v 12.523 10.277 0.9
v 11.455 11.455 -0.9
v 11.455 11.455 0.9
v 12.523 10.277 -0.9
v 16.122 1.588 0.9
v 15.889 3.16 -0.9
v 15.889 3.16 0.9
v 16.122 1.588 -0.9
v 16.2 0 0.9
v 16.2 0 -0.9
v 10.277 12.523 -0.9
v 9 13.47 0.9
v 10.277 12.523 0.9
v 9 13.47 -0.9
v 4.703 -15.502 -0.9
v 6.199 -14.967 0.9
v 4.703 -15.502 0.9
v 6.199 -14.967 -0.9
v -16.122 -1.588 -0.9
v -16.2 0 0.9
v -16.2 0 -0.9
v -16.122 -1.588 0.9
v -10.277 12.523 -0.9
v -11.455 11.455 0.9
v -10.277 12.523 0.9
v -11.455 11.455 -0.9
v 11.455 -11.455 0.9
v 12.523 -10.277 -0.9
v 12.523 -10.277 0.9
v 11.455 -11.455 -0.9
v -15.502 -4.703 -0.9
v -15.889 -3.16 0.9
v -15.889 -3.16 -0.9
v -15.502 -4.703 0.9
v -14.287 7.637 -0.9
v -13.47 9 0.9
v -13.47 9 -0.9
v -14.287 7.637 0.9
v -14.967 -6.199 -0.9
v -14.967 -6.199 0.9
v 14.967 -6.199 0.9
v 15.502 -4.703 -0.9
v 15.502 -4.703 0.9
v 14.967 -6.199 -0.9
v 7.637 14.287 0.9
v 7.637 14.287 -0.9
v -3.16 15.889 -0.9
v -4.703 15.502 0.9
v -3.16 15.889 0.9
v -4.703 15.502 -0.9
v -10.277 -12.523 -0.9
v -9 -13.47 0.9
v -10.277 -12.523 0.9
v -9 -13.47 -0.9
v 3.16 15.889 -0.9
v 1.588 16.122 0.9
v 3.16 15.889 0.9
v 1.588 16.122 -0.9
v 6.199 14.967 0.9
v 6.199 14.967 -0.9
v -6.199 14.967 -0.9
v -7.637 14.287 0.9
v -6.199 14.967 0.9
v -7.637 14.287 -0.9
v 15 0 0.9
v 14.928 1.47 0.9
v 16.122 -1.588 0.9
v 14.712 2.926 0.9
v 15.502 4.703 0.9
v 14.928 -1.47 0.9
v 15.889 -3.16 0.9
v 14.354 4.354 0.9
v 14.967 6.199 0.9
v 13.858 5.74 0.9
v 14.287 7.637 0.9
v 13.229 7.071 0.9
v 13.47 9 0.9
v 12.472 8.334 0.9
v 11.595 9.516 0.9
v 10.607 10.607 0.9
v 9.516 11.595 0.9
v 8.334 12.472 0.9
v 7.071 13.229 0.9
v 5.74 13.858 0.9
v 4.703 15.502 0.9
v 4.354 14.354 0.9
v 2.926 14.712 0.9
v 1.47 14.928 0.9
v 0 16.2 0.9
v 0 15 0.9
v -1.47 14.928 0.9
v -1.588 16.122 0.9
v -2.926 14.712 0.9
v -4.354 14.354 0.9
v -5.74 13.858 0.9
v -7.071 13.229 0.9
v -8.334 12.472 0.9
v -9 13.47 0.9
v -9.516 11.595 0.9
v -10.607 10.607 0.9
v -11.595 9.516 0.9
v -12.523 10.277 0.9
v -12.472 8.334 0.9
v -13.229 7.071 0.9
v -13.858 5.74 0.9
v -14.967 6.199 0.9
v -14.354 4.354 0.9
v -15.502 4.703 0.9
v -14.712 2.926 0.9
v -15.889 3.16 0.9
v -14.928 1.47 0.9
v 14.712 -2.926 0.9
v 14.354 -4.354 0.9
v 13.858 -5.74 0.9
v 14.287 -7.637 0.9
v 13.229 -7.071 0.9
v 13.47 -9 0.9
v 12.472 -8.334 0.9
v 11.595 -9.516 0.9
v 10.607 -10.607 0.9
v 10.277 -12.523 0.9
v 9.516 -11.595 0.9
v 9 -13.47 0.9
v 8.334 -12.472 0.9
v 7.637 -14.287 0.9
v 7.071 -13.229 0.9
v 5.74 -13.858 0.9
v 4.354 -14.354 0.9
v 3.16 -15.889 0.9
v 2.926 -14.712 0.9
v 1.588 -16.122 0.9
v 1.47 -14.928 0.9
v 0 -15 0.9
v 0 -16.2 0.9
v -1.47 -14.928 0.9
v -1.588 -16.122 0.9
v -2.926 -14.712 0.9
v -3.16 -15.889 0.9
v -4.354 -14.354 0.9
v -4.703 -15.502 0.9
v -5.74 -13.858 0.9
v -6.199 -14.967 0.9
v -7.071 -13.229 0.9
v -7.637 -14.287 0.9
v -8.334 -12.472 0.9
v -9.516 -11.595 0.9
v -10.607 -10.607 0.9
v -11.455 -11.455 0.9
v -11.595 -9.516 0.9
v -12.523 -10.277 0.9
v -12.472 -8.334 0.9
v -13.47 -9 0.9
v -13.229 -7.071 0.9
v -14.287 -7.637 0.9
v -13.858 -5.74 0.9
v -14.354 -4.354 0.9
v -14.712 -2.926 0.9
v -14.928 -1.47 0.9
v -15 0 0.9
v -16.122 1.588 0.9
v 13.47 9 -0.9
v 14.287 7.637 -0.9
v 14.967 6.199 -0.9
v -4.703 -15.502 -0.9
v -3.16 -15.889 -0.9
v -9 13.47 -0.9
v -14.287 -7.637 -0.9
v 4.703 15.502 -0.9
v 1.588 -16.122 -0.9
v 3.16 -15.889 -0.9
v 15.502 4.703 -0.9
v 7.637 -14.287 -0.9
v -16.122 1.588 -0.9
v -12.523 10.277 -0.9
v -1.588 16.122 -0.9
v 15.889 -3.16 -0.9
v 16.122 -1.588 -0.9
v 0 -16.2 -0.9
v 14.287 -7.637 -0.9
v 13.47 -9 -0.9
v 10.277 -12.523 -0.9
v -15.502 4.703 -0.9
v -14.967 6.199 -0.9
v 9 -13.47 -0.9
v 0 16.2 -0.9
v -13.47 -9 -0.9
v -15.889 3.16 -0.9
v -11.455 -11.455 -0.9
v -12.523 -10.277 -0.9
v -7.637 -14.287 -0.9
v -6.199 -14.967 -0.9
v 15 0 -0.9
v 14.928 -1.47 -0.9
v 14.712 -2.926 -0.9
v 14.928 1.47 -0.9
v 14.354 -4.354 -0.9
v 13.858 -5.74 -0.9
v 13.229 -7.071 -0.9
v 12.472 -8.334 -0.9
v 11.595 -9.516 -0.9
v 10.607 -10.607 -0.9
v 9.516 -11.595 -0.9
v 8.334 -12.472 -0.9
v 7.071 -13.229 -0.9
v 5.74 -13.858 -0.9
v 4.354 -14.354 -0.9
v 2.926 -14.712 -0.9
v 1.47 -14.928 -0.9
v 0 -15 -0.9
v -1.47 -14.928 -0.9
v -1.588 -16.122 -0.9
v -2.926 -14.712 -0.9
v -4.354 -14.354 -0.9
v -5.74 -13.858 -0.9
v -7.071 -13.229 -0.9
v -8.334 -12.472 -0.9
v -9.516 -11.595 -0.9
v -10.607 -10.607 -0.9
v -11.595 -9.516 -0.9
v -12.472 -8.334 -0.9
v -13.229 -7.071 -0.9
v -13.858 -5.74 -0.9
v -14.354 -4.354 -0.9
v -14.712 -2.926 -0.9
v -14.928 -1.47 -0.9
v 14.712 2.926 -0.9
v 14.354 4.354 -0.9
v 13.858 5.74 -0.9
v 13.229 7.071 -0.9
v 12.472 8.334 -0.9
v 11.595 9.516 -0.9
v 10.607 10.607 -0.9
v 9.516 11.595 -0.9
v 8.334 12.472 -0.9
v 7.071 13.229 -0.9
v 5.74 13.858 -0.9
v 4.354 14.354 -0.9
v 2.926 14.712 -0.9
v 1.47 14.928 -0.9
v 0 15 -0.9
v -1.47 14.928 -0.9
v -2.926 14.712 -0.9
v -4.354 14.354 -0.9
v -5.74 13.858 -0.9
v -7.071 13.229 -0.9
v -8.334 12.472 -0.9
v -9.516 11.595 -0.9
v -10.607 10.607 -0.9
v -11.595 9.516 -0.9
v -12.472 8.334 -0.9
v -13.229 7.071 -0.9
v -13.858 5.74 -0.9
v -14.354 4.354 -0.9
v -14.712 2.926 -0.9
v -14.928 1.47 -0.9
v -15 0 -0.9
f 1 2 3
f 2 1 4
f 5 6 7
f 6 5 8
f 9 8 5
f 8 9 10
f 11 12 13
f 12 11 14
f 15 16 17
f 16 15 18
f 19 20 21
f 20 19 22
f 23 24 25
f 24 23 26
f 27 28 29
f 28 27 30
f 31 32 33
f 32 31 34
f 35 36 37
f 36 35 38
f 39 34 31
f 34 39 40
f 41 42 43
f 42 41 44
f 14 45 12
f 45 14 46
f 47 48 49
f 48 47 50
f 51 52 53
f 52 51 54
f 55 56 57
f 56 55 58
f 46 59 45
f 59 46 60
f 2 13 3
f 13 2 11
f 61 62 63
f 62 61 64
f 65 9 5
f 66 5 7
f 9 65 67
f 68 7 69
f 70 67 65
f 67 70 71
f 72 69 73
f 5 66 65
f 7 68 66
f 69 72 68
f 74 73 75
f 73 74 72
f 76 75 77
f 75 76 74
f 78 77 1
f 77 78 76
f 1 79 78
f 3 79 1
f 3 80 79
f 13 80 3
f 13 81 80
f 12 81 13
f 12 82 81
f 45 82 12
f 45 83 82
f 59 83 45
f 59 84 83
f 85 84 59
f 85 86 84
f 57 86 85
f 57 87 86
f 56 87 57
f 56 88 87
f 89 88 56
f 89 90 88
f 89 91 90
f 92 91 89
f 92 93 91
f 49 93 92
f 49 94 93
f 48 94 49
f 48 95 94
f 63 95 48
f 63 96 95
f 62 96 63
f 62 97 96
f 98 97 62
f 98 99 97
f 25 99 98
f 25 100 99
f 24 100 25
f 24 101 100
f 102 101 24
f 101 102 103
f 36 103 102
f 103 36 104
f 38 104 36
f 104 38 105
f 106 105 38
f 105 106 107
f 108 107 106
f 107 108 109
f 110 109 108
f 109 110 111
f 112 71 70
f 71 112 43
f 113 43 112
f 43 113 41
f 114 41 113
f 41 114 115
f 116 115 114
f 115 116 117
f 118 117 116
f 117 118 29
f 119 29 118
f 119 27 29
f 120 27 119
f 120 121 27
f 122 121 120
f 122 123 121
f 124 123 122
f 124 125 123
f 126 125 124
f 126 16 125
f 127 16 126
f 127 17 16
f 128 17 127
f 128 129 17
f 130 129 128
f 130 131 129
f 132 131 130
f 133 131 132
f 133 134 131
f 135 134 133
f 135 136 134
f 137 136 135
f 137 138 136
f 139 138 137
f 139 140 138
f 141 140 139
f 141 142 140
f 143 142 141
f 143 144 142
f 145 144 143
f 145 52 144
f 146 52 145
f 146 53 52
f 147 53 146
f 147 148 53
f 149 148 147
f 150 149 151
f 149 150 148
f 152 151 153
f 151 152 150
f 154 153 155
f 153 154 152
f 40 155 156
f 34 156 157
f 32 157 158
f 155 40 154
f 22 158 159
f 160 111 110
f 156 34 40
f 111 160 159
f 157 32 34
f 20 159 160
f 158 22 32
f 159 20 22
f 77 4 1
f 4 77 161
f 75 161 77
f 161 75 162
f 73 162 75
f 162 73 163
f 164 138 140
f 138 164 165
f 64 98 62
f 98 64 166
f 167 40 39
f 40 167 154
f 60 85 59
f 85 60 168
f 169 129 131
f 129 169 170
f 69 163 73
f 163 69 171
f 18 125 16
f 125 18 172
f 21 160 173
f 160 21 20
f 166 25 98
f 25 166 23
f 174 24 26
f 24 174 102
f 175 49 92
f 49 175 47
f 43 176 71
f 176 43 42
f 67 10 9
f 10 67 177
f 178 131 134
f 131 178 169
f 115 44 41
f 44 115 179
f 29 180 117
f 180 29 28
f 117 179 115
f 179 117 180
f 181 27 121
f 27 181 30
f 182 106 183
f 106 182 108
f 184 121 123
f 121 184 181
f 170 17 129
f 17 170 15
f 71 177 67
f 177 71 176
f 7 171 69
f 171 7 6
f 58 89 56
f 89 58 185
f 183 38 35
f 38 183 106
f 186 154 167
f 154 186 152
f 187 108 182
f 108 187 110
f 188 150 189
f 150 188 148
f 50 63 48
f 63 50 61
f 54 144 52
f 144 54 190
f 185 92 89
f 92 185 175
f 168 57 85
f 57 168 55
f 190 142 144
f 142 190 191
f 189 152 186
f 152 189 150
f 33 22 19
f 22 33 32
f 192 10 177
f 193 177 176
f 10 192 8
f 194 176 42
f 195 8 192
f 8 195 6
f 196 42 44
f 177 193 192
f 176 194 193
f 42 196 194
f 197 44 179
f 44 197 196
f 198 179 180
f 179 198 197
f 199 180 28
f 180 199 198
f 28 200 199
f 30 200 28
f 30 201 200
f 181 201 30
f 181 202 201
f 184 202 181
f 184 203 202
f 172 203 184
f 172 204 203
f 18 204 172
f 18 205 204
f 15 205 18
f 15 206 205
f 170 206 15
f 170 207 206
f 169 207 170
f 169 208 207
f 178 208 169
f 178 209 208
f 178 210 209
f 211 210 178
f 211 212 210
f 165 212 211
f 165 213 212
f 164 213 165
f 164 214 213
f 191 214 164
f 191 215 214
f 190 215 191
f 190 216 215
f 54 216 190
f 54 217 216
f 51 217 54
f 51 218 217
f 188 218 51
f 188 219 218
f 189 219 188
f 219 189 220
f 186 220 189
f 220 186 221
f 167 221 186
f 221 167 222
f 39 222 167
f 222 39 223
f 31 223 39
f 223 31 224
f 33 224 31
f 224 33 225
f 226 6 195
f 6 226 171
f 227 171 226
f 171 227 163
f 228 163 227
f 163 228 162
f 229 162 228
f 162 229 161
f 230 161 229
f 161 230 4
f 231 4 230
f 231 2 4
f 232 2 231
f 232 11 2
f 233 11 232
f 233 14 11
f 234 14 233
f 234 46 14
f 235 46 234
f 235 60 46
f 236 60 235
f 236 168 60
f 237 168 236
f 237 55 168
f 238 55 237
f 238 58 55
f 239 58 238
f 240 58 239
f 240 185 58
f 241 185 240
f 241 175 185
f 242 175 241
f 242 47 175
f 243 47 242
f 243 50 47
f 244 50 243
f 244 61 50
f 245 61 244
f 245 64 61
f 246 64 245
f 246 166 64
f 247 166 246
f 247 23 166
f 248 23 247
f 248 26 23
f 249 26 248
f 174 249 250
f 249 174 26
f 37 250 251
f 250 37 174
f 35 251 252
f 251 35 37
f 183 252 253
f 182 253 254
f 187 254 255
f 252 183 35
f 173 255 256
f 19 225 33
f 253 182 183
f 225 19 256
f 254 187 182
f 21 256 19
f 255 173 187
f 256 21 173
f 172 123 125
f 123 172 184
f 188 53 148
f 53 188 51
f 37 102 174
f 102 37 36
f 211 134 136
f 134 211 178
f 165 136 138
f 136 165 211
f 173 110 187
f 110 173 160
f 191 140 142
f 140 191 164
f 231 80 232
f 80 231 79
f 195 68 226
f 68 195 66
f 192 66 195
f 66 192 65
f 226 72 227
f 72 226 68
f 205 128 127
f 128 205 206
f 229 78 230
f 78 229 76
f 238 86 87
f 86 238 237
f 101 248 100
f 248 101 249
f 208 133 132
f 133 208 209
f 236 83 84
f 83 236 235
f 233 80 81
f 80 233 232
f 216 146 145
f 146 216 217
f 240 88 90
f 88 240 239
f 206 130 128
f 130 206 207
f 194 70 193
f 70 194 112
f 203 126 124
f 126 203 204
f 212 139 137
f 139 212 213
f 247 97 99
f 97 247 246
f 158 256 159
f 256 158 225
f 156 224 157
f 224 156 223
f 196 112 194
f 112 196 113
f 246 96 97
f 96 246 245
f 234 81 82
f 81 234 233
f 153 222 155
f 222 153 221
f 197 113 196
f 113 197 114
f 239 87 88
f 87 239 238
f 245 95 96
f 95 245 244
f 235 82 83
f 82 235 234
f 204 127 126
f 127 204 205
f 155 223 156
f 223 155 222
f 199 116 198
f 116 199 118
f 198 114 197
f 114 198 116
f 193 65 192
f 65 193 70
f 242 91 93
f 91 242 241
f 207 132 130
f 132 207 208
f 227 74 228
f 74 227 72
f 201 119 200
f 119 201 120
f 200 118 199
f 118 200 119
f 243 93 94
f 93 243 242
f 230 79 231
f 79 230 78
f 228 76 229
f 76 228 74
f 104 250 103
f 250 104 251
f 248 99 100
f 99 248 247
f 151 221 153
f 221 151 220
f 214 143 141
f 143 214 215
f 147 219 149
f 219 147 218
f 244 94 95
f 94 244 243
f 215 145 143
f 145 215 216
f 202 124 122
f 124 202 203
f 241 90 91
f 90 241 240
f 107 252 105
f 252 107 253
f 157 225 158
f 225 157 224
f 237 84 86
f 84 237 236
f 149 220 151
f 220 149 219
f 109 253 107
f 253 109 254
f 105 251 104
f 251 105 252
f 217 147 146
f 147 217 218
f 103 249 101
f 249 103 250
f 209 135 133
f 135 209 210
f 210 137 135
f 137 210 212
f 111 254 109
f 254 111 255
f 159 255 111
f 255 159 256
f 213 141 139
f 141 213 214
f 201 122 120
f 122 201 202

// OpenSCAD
/******************************************************************
*                                                                 *
* OpenFlexure Microscope: actuator tension band                   *
*                                                                 *
* The microscope stage actuators need a tension band to provide a *
* reciprocal force between the captive nut in the gear and the    *
* stage arm. The recommendation is to use a Viton O-ring, but if  *
* you have a 3d printer can reliably print with TPU filament, you *
* can print this instead and use it in place of the O-ring.       *
*                                                                 *
* Print this part using .1mm layer height, with randomized        *
* perimeter start and end positions if possible. For strength,    *
* The part should be printed entirely with perimeters, no gap     *
* fill. The part is designed to be printed with a 0.4mm nozzle.   *
* Printing with a 1mm nozzle hasn't been tested, and isn't        *
* recommended.
*                                                                 *
* (c) Bill Schaller, June 2020                                    *
* Released under the CERN Open Hardware License v1.2              *
*                                                                 *
******************************************************************/

/**************
 * PARAMETERS *
 **************/
$fn = 64;
nozzle_width = 0.4;
band_height = 1.8;
ideal_band_thickness = 1.5;
band_inner_diameter = 30;

/*********
 * MODEL *
 *********/
actual_band_thickness =
    ideal_band_thickness - (ideal_band_thickness % nozzle_width);
band_outer_diameter = band_inner_diameter + actual_band_thickness * 2;

difference(){
    cylinder(h=band_height, d=band_outer_diameter, center = true);
    cylinder(h=band_height+1, d=band_inner_diameter, center = true);
}
